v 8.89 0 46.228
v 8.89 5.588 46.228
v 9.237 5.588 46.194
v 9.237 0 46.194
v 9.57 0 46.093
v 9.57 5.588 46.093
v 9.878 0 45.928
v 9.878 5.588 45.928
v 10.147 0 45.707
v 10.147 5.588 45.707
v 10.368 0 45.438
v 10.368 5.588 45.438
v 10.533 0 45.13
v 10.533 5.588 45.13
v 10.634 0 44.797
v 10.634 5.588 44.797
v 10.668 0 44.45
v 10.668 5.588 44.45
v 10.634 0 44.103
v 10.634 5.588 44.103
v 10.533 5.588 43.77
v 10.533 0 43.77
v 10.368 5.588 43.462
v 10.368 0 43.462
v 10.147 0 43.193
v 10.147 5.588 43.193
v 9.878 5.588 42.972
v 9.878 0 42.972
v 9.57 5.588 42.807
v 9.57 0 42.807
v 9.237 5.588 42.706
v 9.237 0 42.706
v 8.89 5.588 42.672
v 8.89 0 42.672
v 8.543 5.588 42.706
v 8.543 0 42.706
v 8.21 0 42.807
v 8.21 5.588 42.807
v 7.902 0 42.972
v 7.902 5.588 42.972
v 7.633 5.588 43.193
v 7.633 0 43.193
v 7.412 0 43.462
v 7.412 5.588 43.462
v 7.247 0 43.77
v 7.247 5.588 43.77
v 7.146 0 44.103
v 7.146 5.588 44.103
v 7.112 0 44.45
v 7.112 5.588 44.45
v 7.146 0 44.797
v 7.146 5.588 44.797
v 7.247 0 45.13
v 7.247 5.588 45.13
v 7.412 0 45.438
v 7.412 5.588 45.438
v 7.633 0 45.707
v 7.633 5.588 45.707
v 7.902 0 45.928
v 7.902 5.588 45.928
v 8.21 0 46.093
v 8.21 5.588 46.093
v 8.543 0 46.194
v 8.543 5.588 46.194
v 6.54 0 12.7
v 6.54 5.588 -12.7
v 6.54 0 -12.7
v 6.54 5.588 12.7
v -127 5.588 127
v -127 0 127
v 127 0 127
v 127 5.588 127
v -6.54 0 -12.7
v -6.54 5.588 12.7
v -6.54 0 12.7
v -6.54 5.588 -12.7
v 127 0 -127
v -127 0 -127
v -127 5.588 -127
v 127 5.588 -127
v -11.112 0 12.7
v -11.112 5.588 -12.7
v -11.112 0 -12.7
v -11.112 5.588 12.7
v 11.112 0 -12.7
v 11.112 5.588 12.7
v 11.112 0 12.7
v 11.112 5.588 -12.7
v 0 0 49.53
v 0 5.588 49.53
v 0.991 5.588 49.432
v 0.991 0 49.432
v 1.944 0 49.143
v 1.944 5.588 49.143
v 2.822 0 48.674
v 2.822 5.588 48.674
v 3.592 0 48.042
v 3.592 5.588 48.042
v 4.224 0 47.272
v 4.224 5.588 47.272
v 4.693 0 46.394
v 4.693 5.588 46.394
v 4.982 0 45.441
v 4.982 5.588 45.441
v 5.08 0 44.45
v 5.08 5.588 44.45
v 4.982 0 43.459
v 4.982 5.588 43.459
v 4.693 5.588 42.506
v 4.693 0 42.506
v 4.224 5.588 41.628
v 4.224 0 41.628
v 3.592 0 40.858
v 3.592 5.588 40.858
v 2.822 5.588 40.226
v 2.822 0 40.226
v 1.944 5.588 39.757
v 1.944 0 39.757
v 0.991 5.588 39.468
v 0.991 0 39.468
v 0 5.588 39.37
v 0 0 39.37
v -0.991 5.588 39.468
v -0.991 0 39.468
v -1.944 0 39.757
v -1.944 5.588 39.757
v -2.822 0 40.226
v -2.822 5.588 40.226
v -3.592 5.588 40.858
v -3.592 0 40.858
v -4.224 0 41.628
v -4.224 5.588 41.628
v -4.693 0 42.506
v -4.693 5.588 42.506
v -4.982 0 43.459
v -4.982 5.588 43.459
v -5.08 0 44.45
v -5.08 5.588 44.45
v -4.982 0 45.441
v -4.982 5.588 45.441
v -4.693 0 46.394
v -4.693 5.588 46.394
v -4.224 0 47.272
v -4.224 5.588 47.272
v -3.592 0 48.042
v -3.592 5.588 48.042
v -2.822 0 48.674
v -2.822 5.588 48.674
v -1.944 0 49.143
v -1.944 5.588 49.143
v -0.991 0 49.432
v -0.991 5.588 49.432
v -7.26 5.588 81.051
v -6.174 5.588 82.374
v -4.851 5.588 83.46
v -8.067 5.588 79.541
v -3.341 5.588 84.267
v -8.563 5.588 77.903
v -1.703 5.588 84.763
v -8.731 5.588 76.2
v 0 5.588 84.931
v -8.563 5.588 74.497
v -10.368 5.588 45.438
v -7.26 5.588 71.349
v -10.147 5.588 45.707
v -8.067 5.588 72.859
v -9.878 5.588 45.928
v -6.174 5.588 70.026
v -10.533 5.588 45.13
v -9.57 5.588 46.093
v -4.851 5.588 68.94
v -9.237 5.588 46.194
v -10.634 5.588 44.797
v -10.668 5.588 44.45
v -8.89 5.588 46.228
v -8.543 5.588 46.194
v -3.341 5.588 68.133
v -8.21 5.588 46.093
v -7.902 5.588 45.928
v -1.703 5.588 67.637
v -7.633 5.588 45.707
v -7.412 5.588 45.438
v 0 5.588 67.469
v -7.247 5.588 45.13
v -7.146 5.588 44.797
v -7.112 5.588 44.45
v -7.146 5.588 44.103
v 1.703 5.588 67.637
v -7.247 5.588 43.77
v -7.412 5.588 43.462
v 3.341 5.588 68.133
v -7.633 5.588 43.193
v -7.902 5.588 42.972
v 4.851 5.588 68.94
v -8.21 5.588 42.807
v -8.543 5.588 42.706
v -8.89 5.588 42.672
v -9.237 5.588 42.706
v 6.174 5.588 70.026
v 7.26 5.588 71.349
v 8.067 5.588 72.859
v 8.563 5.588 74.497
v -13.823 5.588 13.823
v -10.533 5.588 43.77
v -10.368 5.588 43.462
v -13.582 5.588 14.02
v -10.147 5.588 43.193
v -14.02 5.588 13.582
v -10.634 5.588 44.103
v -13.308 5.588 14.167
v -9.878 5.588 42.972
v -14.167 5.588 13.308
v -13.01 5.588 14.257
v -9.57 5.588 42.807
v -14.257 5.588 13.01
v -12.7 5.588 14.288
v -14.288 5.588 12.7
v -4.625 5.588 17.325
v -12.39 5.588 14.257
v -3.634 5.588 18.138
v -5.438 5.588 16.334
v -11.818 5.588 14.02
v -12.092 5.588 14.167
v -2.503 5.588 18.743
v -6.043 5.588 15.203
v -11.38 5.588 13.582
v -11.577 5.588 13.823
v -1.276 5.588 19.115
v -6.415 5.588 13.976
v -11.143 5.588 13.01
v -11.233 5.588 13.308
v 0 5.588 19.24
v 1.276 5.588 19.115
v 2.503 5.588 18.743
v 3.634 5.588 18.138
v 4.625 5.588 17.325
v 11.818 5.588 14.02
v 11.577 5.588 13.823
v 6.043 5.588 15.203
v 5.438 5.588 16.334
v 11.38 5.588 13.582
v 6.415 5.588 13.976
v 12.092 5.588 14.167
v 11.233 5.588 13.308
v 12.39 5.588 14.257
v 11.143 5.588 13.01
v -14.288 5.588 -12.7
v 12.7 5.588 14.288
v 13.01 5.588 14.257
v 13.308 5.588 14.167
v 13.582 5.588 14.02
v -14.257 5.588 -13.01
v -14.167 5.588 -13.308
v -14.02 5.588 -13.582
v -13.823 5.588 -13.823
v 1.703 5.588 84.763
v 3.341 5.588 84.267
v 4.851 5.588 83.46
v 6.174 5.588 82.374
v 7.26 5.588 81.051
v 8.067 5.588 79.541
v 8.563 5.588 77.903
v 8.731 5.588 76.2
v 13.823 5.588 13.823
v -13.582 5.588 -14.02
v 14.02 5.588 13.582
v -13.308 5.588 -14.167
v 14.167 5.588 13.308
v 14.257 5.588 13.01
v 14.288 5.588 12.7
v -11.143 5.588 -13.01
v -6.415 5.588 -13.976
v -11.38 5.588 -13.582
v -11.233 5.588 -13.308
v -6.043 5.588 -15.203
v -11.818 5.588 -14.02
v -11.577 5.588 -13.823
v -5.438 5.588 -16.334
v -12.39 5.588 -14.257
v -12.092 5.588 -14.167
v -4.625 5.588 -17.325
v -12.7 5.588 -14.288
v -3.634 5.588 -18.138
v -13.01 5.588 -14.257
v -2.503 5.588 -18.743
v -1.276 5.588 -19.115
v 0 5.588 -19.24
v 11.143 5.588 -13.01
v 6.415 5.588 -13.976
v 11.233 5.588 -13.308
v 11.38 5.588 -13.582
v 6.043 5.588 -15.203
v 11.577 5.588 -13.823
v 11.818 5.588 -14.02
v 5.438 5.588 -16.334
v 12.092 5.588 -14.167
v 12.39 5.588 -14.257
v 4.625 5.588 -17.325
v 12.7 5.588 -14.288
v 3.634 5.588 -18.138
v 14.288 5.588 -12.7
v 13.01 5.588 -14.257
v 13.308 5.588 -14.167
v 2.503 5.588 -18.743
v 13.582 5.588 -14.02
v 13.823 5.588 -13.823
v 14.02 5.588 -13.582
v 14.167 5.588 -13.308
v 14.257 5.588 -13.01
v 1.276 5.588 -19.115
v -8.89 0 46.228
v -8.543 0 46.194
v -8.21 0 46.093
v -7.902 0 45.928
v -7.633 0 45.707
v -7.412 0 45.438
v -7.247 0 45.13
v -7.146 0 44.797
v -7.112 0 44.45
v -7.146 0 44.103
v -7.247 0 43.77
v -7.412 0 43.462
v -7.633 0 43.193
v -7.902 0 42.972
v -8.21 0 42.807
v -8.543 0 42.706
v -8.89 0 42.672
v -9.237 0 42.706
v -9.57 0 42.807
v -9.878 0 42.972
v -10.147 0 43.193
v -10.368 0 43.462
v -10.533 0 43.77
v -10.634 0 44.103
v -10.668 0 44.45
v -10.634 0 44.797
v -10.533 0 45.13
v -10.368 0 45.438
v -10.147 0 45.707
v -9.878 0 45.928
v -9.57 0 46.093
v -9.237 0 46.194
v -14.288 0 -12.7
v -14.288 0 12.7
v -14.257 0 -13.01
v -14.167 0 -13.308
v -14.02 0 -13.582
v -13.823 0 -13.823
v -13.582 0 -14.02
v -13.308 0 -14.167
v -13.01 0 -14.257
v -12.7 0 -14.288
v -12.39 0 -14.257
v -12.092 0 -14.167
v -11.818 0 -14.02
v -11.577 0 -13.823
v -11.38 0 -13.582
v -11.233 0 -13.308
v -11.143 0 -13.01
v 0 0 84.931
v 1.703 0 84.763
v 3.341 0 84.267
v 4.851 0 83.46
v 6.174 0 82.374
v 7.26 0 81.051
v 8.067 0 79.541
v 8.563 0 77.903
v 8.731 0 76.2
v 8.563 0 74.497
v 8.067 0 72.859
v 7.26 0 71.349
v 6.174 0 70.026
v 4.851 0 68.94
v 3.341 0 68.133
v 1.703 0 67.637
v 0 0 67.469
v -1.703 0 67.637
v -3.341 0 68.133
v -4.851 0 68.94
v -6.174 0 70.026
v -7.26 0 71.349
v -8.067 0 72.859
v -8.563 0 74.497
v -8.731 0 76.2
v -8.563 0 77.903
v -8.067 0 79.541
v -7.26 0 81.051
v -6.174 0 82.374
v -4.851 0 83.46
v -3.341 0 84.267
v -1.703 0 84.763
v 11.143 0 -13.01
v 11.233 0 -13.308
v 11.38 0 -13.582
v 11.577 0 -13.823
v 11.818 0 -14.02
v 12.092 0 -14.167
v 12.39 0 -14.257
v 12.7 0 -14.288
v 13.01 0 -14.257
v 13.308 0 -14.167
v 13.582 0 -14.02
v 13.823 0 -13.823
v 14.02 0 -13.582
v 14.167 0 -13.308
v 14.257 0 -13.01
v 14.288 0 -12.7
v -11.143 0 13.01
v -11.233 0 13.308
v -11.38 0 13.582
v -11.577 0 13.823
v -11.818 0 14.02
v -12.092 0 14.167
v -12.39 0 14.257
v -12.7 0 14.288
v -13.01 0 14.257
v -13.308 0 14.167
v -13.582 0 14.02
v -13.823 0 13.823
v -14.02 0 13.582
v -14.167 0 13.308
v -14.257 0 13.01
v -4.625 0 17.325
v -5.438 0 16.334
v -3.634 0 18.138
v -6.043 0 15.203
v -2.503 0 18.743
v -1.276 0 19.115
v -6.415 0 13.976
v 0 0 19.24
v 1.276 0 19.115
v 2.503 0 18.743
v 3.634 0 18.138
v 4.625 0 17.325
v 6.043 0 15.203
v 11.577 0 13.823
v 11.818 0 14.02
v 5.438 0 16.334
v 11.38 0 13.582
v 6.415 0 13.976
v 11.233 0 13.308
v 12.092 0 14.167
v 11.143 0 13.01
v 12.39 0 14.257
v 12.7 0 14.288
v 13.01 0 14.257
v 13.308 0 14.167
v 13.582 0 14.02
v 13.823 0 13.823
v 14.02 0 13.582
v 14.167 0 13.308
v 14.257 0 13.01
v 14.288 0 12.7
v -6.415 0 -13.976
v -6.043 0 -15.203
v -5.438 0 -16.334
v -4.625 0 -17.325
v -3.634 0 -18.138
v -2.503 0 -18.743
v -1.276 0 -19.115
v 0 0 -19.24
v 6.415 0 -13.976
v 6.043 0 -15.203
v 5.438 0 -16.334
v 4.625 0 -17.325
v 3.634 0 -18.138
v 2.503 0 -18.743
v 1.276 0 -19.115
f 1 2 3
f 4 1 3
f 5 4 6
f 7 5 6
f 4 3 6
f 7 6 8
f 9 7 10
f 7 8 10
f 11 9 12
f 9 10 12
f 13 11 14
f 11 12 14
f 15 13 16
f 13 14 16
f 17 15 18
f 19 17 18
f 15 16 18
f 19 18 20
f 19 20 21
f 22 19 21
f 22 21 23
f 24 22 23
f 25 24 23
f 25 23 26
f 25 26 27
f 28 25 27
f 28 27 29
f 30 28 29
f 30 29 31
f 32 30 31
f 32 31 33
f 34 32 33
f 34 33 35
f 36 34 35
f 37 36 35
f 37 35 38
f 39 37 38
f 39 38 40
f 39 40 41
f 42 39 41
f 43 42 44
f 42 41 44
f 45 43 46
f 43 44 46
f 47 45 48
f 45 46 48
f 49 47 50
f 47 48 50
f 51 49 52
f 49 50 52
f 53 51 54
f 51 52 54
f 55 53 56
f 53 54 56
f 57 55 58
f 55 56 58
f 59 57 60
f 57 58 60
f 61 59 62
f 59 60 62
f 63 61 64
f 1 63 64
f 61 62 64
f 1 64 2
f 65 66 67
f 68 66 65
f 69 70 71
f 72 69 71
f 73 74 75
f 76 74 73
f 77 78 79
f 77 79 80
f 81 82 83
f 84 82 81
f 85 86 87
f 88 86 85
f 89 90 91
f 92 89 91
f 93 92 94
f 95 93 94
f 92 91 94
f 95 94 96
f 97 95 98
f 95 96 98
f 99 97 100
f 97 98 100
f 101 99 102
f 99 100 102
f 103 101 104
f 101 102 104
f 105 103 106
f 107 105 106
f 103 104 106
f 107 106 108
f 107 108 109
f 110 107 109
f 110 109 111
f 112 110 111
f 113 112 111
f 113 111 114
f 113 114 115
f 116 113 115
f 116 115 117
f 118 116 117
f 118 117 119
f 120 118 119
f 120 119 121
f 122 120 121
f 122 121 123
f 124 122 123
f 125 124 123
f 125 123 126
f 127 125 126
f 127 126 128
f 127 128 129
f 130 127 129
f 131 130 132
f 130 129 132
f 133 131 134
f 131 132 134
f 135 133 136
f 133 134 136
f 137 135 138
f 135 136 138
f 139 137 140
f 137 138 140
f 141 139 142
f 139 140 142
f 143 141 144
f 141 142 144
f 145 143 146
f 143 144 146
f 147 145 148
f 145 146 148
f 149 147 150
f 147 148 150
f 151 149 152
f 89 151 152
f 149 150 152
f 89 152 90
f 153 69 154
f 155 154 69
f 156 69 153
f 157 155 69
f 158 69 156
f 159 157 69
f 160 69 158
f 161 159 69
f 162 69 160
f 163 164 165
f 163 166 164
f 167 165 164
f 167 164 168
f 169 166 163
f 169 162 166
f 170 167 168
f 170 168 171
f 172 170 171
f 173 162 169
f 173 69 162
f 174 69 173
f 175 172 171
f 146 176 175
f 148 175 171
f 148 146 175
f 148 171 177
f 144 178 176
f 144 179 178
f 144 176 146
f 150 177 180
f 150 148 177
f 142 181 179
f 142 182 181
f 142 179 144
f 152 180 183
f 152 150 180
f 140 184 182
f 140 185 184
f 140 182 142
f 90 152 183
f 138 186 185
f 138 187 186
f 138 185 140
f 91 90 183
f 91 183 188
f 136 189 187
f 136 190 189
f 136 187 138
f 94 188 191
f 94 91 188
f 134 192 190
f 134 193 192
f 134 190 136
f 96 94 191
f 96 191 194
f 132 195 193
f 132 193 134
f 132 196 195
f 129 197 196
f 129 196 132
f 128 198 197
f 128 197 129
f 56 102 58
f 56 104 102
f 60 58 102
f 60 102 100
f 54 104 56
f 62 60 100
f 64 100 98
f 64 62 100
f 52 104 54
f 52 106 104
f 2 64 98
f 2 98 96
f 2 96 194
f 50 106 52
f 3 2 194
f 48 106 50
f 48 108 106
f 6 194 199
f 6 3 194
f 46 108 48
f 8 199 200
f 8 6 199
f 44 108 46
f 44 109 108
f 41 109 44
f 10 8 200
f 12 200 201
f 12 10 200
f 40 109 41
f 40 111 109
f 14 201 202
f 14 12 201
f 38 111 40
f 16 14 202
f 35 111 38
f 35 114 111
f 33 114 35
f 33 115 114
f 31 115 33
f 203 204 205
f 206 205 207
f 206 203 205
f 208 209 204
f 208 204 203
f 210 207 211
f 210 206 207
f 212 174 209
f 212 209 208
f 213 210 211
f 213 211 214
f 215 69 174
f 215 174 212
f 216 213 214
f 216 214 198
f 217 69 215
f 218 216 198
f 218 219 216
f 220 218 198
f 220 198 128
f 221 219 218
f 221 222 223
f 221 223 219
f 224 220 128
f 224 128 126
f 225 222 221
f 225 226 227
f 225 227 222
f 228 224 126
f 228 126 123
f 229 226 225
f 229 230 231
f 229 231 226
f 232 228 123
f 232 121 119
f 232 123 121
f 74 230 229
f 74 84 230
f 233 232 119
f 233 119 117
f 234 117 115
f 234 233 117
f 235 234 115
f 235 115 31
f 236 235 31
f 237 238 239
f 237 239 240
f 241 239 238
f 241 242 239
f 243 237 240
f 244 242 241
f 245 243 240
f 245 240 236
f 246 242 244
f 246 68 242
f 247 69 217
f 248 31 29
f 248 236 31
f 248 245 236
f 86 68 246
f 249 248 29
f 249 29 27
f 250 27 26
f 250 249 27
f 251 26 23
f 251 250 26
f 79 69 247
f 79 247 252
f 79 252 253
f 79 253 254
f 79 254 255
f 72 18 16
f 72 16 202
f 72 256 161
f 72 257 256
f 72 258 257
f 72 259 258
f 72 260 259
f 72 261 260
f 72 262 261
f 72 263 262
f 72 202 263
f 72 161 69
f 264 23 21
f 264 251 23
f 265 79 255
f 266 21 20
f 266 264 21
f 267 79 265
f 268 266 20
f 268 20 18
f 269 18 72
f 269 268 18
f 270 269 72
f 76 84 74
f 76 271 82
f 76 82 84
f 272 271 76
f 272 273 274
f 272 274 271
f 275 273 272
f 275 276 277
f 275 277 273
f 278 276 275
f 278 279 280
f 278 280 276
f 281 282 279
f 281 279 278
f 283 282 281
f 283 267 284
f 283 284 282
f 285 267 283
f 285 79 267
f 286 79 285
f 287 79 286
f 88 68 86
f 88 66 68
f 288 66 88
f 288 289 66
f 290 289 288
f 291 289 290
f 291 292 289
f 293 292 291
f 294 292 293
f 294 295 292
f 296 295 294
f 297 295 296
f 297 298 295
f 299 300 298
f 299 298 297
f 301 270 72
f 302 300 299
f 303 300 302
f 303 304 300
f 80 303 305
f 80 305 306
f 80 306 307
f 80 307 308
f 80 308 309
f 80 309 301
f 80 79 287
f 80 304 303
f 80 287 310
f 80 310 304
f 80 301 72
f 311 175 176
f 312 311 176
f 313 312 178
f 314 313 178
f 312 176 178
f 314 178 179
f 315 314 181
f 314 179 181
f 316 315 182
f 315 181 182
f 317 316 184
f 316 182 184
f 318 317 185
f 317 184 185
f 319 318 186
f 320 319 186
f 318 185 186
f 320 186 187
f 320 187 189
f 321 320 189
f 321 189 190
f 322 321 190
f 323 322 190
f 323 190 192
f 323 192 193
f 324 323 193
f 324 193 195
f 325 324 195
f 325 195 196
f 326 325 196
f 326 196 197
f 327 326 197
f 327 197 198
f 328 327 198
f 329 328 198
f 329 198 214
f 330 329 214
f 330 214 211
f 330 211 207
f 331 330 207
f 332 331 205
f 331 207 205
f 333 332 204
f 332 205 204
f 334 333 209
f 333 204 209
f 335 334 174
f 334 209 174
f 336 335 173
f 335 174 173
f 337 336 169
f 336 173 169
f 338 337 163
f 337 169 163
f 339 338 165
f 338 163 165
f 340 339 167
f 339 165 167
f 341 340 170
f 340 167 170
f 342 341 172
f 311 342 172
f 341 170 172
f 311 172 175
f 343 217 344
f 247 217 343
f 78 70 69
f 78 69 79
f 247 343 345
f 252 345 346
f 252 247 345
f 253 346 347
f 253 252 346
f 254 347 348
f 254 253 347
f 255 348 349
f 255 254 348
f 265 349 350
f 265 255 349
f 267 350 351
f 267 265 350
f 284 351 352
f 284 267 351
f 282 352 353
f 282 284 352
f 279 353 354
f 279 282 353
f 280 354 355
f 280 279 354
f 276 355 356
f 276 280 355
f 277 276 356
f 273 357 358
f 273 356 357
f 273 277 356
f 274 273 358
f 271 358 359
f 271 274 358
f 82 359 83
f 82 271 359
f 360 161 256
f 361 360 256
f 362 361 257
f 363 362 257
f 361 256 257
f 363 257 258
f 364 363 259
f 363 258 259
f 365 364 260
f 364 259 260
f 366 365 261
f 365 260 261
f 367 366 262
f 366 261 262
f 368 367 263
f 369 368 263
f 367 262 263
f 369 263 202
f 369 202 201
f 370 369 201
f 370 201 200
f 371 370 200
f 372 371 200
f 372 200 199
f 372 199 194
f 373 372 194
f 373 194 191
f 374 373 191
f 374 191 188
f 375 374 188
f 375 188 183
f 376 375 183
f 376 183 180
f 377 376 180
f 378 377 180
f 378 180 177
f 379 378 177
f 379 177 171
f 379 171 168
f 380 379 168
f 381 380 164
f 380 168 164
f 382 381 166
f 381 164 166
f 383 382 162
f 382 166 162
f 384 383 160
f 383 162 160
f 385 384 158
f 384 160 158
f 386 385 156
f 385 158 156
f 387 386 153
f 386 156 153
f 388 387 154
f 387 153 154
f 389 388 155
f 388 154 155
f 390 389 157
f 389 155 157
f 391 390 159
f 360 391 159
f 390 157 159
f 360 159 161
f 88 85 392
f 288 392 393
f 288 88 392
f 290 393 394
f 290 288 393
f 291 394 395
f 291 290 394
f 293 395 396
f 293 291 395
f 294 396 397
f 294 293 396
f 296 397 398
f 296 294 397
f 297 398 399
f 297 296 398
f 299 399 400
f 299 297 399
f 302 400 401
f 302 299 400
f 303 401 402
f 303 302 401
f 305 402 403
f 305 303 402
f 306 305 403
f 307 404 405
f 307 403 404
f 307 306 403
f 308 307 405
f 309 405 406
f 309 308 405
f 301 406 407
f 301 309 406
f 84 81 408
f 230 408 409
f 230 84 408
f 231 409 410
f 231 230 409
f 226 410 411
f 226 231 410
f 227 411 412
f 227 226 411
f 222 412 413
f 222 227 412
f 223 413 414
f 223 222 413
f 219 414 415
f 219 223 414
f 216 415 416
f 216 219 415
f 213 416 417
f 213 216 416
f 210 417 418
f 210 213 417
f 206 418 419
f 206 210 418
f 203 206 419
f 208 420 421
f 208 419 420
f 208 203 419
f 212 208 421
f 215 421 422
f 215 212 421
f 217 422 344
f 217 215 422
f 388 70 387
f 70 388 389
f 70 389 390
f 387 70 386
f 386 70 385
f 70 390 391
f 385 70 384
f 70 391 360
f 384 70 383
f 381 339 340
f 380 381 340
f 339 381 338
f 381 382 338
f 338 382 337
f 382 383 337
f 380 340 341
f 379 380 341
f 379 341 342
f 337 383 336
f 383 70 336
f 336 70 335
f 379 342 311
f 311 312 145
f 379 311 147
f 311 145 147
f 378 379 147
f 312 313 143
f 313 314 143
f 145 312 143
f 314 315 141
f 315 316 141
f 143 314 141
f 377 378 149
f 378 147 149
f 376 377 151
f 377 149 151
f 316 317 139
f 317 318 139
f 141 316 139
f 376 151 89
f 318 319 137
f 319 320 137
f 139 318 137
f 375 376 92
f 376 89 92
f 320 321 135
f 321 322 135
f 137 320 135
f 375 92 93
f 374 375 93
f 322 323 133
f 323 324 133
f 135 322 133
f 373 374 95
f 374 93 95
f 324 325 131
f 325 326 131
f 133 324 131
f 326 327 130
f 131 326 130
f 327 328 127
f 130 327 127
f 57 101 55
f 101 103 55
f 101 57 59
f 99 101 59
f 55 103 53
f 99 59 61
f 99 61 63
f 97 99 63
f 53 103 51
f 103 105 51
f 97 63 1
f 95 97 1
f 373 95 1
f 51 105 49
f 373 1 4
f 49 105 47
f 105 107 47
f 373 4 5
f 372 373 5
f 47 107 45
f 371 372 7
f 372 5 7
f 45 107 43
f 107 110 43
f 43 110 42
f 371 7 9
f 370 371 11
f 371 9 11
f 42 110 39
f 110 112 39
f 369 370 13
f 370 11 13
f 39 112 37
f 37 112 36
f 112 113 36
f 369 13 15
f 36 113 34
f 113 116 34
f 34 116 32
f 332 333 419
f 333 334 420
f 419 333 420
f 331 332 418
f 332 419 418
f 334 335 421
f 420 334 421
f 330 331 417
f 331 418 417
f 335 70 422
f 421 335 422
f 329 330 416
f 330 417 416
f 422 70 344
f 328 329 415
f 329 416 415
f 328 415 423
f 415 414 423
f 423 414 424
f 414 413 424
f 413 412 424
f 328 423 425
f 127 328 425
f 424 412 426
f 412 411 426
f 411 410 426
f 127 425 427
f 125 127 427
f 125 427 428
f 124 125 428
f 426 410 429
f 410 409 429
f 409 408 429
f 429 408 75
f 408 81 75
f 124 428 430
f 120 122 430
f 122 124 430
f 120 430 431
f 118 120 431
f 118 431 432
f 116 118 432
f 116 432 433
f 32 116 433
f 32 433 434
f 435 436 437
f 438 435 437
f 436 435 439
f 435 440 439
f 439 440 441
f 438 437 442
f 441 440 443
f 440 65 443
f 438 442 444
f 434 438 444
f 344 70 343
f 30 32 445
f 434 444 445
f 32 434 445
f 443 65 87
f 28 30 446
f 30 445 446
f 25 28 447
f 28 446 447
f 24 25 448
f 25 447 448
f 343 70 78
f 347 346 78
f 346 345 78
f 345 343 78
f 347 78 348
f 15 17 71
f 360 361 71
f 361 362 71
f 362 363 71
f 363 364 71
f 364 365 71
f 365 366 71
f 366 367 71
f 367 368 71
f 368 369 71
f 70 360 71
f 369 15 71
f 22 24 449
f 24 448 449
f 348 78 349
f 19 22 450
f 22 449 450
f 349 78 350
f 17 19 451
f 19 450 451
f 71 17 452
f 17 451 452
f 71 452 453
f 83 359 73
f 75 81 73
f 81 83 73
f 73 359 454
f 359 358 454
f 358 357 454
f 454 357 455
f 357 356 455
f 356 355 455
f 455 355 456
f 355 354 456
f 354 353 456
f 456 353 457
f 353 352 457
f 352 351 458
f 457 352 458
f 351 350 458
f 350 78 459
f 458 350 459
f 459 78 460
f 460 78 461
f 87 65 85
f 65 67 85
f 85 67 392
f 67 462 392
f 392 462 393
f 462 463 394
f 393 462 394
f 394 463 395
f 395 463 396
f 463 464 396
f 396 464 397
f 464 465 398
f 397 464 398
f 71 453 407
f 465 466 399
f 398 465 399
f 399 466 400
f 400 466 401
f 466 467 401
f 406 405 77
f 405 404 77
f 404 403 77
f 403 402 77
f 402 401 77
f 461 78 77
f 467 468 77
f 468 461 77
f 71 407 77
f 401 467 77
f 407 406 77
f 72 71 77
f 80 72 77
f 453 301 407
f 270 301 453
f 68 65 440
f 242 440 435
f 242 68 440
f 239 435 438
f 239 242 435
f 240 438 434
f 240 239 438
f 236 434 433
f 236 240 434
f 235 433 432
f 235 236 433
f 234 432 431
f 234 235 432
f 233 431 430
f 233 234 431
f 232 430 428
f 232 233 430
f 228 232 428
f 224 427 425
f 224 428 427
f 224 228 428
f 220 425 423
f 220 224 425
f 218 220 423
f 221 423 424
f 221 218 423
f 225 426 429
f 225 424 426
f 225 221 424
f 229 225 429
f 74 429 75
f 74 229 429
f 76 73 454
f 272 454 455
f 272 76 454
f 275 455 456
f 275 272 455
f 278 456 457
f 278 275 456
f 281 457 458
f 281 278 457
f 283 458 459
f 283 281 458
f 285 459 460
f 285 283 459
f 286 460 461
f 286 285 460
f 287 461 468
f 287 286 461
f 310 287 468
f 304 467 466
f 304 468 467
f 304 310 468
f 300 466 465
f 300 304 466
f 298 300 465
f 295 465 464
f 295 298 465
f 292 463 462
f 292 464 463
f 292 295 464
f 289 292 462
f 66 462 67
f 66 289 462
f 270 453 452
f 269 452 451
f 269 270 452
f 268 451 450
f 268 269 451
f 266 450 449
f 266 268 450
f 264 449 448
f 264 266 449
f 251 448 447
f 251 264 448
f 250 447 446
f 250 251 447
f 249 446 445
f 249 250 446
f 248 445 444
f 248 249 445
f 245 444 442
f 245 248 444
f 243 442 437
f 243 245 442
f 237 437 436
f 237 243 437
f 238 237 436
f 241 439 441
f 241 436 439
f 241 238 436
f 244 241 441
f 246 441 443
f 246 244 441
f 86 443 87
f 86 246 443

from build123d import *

# Parameters (mm, degrees)
SKETCH1_W           = 254
SKETCH1_H           = 254
BOSS_EXTRUDE1_DEPTH = 5.588
SKETCH2_R           = 8.73125
SKETCH2_R_2         = 5.08
SKETCH2_R_3         = 1.778
CUT_EXTRUDE1_DEPTH  = 180.692030274


with BuildPart() as part:
    # Sketch1 → Boss-Extrude1 (new body)
    with BuildSketch(Plane(origin=(0, 0, 0), x_dir=(1, 0, 0), z_dir=(0, 1, 0))):
        Rectangle(SKETCH1_W, SKETCH1_H)
    extrude(amount=BOSS_EXTRUDE1_DEPTH)

    # Sketch2 → Cut-Extrude1 (cut, through all)
    with BuildSketch(Plane(origin=(0, 5.588, 0), x_dir=(1, 0, 0), z_dir=(0, 1, 0))):
        with Locations(Location((0, -76.2, 0), (0, 0, 270))):
            Circle(SKETCH2_R)
        with Locations(Location((0, -44.45, 0), (0, 0, 270))):
            Circle(SKETCH2_R_2)
        with Locations(Location((-8.89, -44.45, 0), (0, 0, 270))):
            Circle(SKETCH2_R_3)
        with Locations(Location((8.89, -44.45, 0), (0, 0, 270))):
            Circle(SKETCH2_R_3)
        with BuildLine():
            Line((6.5405, 12.7), (6.5405, -12.7))
            ThreePointArc((6.5405, -12.7), (0, -19.2405), (-6.5405, -12.7))
            Line((-6.5405, -12.7), (-6.5405, 12.7))
            ThreePointArc((-6.5405, 12.7), (0, 19.2405), (6.5405, 12.7))
        make_face()
        with BuildLine():
            Line((-11.1125, 12.7), (-11.1125, -12.7))
            ThreePointArc((-11.1125, -12.7), (-12.7, -14.2875), (-14.2875, -12.7))
            Line((-14.2875, -12.7), (-14.2875, 12.7))
            ThreePointArc((-14.2875, 12.7), (-12.7, 14.2875), (-11.1125, 12.7))
        make_face()
        with BuildLine():
            Line((14.2875, 12.7), (14.2875, -12.7))
            ThreePointArc((14.2875, -12.7), (12.7, -14.2875), (11.1125, -12.7))
            Line((11.1125, -12.7), (11.1125, 12.7))
            ThreePointArc((11.1125, 12.7), (12.7, 14.2875), (14.2875, 12.7))
        make_face()
    extrude(amount=-CUT_EXTRUDE1_DEPTH, mode=Mode.SUBTRACT)


solid = part.part
